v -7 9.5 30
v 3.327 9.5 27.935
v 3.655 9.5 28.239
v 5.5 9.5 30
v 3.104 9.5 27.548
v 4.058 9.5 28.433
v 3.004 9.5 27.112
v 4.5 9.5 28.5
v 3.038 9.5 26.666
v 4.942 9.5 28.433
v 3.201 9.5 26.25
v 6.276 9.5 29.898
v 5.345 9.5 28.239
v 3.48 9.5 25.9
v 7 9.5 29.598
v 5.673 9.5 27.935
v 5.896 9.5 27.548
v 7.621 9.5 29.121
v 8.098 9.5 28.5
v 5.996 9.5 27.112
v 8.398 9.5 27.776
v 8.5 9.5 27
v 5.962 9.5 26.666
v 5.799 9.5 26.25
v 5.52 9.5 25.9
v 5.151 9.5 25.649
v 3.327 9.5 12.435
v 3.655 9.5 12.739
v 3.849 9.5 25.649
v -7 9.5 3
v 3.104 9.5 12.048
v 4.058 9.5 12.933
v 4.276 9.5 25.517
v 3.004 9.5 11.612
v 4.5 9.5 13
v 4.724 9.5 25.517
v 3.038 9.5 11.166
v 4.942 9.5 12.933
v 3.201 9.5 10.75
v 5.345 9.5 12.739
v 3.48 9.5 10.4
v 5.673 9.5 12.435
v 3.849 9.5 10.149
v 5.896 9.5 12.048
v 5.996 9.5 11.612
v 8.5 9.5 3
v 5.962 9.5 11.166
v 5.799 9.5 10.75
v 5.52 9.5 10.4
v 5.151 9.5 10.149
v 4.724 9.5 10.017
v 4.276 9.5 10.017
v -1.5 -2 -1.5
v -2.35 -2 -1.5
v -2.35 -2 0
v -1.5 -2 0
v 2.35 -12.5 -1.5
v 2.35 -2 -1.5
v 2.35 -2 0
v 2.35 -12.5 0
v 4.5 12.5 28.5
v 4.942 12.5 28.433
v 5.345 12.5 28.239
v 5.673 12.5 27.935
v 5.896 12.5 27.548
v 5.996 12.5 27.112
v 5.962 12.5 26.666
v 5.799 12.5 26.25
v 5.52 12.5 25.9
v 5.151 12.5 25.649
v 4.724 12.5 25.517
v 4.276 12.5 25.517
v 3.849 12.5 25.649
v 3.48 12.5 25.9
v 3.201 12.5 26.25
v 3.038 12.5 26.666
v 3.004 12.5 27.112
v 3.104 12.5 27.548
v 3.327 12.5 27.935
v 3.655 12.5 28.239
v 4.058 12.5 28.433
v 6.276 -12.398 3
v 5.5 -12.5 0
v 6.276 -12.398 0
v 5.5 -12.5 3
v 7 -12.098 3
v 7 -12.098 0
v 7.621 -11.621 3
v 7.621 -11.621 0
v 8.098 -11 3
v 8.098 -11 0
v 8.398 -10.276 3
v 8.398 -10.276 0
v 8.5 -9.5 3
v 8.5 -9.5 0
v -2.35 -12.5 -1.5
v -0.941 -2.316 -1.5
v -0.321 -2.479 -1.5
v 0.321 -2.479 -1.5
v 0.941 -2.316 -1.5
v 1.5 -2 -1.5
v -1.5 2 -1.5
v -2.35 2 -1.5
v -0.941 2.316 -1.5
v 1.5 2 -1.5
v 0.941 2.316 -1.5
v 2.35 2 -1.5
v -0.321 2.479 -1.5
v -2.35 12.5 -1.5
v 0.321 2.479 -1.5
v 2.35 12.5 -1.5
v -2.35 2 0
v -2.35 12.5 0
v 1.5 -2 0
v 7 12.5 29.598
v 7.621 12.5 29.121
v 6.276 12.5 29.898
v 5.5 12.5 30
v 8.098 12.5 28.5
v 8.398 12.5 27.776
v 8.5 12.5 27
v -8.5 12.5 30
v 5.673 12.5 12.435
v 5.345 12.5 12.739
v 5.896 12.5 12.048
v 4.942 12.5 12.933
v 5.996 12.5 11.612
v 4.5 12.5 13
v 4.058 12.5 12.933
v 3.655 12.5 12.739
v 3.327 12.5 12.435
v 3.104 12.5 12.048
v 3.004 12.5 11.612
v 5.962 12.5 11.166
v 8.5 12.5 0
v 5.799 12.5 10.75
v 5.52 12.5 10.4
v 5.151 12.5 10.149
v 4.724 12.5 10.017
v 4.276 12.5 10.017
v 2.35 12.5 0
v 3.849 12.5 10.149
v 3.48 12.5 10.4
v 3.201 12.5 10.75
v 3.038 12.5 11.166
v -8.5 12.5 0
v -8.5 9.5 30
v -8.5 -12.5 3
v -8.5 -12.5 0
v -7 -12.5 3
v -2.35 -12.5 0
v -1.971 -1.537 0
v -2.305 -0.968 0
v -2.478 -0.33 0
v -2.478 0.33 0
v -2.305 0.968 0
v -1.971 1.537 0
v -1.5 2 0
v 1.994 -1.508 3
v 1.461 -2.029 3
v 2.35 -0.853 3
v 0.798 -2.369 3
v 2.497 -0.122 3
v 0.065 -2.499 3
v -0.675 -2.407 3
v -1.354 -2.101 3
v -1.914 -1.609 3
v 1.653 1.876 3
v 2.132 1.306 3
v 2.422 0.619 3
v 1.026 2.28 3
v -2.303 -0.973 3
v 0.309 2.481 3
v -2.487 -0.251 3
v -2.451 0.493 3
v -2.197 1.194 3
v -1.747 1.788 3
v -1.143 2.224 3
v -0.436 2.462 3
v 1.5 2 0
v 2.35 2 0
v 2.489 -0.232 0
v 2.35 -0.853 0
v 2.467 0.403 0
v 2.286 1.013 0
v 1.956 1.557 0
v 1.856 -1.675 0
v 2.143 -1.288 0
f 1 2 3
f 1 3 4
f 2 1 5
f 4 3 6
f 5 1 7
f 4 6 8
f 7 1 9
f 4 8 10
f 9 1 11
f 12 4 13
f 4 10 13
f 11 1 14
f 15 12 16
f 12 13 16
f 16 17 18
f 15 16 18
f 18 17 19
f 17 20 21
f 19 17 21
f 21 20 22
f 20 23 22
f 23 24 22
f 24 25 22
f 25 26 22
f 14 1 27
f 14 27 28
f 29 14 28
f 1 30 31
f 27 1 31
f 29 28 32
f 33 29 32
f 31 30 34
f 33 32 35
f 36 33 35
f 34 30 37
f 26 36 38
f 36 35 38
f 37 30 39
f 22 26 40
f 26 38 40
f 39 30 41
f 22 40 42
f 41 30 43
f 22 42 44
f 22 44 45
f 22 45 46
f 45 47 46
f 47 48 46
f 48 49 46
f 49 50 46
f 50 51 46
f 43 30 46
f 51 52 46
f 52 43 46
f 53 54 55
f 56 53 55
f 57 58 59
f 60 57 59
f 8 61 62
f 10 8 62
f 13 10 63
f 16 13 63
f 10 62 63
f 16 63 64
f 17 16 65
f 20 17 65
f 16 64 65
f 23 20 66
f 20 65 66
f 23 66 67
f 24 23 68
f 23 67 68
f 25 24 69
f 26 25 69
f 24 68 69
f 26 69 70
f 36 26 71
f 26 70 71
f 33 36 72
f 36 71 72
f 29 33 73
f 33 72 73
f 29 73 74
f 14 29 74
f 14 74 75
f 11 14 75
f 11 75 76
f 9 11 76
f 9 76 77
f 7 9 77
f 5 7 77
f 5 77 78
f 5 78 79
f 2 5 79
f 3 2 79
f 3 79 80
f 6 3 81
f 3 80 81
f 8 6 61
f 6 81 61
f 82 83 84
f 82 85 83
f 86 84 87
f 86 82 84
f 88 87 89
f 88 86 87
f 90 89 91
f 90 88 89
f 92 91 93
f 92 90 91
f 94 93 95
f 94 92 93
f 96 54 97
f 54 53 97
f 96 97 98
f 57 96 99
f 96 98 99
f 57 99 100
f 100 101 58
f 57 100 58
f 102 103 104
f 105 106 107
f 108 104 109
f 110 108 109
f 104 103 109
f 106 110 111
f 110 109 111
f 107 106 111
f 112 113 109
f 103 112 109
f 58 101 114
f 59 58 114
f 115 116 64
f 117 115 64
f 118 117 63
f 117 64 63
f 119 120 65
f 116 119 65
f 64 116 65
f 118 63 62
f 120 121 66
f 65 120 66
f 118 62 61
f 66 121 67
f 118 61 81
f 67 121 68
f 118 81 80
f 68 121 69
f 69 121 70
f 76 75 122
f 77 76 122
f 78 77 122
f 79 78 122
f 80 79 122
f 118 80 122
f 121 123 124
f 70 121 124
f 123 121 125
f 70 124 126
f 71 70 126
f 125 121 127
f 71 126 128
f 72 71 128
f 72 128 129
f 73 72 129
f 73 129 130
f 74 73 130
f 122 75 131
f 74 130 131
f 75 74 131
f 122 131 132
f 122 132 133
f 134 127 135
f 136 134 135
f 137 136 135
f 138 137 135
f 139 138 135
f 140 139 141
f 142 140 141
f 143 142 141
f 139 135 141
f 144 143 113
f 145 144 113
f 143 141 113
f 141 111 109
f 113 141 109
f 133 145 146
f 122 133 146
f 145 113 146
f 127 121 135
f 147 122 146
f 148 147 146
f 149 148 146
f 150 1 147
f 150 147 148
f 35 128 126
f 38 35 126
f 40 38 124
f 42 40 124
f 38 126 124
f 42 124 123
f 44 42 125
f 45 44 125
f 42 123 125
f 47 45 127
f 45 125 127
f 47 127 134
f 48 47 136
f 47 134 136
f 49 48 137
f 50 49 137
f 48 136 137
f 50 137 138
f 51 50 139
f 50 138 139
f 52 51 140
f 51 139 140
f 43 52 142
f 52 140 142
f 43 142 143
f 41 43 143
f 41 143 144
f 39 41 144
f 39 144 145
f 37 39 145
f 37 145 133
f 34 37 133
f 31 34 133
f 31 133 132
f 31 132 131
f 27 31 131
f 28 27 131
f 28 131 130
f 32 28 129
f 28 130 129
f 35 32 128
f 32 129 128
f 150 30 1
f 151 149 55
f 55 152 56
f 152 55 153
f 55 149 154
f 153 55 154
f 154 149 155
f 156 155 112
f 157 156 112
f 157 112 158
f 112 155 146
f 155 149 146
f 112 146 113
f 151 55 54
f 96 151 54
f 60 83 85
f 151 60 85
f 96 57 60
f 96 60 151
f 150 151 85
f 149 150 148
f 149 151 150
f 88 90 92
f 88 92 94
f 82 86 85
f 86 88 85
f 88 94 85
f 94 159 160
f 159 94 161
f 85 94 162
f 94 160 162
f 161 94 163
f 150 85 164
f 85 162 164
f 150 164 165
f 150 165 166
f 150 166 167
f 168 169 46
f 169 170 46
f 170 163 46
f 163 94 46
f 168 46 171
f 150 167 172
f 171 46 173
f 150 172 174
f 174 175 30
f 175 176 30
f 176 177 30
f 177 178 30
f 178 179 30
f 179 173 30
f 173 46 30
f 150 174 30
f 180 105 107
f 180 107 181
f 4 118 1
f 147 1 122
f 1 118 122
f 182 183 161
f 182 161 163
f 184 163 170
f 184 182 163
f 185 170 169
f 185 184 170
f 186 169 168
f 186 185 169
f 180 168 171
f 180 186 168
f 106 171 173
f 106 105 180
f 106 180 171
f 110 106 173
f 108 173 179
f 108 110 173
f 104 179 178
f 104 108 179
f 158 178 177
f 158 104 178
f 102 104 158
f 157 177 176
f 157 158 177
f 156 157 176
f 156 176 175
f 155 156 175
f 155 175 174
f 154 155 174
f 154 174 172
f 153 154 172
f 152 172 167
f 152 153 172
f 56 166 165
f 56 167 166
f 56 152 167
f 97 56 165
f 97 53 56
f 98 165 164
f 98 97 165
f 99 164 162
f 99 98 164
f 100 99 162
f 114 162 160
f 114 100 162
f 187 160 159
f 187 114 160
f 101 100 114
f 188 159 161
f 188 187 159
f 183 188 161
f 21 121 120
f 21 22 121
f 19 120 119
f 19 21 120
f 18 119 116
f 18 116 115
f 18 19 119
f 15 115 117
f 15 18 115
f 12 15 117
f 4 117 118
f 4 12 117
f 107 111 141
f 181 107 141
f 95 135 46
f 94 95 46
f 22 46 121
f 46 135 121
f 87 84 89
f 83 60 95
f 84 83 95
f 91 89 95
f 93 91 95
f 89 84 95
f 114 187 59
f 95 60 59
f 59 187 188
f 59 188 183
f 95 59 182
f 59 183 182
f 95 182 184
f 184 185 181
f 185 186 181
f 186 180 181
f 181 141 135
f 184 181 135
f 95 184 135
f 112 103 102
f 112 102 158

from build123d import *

# Parameters (mm, degrees)
BOSS_EXTRU_1_DEPTH           = 12.5
ENL_V_MAT_EXTRU_1_DEPTH      = 34.966383385
ENL_V_MAT_EXTRU_1_DEPTH_BACK = 34.966383385
ESQUISSE2_R                  = 2.5
ESQUISSE5_W                  = 1.5
ESQUISSE5_H                  = 4
ENL_V_MAT_EXTRU_3_DEPTH      = 35.263282096
ESQUISSE6_W                  = 17
ESQUISSE6_H                  = 30
ESQUISSE6_R                  = 1.5
BOSS_EXTRU_2_DEPTH           = 3
ENL_V_MAT_EXTRU_4_DEPTH      = 37.006943775
CONG_1_R                     = 3


with BuildPart() as part:
    # Esquisse1 → Boss.-Extru.1 (new, symmetric)
    with BuildSketch(Plane(origin=(0, 0, 0), x_dir=(1, 0, 0), z_dir=(0, 1, 0))):
        Polygon((2.35, 0), (8.5, 0), (8.5, -3), (-7, -3), (-7, -30), (-8.5, -30), (-8.5, 0), (-2.35, 0), (-2.35, 1.5), (2.35, 1.5), align=None)
    extrude(amount=BOSS_EXTRU_1_DEPTH, both=True)

    # Esquisse2 → Enlèv. mat.-Extru.1 (cut, two sides: drawn at the far end of the back side and taken through both)
    with BuildSketch(Plane(origin=(-1.372446517, 0, 0), x_dir=(1, 0, 0), z_dir=(0, 0, 1)).offset(-ENL_V_MAT_EXTRU_1_DEPTH_BACK)):
        with Locations(Location((1.372446517, 0, 0), (0, 0, 340.051556411))):
            Circle(ESQUISSE2_R)
    extrude(amount=ENL_V_MAT_EXTRU_1_DEPTH + ENL_V_MAT_EXTRU_1_DEPTH_BACK, mode=Mode.SUBTRACT)

    # Esquisse5 → Enlèv. mat.-Extru.3 (cut, through all)
    with BuildSketch(Plane.ZY.offset(2.35)):
        with Locations((-0.75, 0)):
            Rectangle(ESQUISSE5_W, ESQUISSE5_H)
    extrude(amount=-ENL_V_MAT_EXTRU_3_DEPTH, mode=Mode.SUBTRACT)

    # Esquisse6 → Boss.-Extru.2 (add)
    with BuildSketch(Plane(origin=(0, 12.5, 0), x_dir=(1, 0, 0), z_dir=(0, 1, 0))):
        with Locations((0, -15)):
            Rectangle(ESQUISSE6_W, ESQUISSE6_H)
        with Locations(Location((4.5, -27, 0), (0, 0, 270))):
            Circle(ESQUISSE6_R, mode=Mode.SUBTRACT)
        with Locations(Location((4.5, -11.5, 0), (0, 0, 270))):
            Circle(ESQUISSE6_R, mode=Mode.SUBTRACT)
    extrude(amount=-BOSS_EXTRU_2_DEPTH)

    # Esquisse7 → Enlèv. mat.-Extru.4 (cut, through all)
    with BuildSketch(Plane(origin=(-7, 0, 0), x_dir=(0, 0, -1), z_dir=(1, 0, 0))):
        Polygon((-30, 9.5), (-3, -12.5), (-30, -12.5), align=None)
    extrude(amount=-ENL_V_MAT_EXTRU_4_DEPTH, mode=Mode.SUBTRACT)

    # Congé1
    cong_1_edges = [part.edges().sort_by_distance(p)[0] for p in [
        (8.5, -12.5, 1.5),
        (8.5, 11, 30),
    ]]
    fillet(cong_1_edges, radius=CONG_1_R)


solid = part.part
